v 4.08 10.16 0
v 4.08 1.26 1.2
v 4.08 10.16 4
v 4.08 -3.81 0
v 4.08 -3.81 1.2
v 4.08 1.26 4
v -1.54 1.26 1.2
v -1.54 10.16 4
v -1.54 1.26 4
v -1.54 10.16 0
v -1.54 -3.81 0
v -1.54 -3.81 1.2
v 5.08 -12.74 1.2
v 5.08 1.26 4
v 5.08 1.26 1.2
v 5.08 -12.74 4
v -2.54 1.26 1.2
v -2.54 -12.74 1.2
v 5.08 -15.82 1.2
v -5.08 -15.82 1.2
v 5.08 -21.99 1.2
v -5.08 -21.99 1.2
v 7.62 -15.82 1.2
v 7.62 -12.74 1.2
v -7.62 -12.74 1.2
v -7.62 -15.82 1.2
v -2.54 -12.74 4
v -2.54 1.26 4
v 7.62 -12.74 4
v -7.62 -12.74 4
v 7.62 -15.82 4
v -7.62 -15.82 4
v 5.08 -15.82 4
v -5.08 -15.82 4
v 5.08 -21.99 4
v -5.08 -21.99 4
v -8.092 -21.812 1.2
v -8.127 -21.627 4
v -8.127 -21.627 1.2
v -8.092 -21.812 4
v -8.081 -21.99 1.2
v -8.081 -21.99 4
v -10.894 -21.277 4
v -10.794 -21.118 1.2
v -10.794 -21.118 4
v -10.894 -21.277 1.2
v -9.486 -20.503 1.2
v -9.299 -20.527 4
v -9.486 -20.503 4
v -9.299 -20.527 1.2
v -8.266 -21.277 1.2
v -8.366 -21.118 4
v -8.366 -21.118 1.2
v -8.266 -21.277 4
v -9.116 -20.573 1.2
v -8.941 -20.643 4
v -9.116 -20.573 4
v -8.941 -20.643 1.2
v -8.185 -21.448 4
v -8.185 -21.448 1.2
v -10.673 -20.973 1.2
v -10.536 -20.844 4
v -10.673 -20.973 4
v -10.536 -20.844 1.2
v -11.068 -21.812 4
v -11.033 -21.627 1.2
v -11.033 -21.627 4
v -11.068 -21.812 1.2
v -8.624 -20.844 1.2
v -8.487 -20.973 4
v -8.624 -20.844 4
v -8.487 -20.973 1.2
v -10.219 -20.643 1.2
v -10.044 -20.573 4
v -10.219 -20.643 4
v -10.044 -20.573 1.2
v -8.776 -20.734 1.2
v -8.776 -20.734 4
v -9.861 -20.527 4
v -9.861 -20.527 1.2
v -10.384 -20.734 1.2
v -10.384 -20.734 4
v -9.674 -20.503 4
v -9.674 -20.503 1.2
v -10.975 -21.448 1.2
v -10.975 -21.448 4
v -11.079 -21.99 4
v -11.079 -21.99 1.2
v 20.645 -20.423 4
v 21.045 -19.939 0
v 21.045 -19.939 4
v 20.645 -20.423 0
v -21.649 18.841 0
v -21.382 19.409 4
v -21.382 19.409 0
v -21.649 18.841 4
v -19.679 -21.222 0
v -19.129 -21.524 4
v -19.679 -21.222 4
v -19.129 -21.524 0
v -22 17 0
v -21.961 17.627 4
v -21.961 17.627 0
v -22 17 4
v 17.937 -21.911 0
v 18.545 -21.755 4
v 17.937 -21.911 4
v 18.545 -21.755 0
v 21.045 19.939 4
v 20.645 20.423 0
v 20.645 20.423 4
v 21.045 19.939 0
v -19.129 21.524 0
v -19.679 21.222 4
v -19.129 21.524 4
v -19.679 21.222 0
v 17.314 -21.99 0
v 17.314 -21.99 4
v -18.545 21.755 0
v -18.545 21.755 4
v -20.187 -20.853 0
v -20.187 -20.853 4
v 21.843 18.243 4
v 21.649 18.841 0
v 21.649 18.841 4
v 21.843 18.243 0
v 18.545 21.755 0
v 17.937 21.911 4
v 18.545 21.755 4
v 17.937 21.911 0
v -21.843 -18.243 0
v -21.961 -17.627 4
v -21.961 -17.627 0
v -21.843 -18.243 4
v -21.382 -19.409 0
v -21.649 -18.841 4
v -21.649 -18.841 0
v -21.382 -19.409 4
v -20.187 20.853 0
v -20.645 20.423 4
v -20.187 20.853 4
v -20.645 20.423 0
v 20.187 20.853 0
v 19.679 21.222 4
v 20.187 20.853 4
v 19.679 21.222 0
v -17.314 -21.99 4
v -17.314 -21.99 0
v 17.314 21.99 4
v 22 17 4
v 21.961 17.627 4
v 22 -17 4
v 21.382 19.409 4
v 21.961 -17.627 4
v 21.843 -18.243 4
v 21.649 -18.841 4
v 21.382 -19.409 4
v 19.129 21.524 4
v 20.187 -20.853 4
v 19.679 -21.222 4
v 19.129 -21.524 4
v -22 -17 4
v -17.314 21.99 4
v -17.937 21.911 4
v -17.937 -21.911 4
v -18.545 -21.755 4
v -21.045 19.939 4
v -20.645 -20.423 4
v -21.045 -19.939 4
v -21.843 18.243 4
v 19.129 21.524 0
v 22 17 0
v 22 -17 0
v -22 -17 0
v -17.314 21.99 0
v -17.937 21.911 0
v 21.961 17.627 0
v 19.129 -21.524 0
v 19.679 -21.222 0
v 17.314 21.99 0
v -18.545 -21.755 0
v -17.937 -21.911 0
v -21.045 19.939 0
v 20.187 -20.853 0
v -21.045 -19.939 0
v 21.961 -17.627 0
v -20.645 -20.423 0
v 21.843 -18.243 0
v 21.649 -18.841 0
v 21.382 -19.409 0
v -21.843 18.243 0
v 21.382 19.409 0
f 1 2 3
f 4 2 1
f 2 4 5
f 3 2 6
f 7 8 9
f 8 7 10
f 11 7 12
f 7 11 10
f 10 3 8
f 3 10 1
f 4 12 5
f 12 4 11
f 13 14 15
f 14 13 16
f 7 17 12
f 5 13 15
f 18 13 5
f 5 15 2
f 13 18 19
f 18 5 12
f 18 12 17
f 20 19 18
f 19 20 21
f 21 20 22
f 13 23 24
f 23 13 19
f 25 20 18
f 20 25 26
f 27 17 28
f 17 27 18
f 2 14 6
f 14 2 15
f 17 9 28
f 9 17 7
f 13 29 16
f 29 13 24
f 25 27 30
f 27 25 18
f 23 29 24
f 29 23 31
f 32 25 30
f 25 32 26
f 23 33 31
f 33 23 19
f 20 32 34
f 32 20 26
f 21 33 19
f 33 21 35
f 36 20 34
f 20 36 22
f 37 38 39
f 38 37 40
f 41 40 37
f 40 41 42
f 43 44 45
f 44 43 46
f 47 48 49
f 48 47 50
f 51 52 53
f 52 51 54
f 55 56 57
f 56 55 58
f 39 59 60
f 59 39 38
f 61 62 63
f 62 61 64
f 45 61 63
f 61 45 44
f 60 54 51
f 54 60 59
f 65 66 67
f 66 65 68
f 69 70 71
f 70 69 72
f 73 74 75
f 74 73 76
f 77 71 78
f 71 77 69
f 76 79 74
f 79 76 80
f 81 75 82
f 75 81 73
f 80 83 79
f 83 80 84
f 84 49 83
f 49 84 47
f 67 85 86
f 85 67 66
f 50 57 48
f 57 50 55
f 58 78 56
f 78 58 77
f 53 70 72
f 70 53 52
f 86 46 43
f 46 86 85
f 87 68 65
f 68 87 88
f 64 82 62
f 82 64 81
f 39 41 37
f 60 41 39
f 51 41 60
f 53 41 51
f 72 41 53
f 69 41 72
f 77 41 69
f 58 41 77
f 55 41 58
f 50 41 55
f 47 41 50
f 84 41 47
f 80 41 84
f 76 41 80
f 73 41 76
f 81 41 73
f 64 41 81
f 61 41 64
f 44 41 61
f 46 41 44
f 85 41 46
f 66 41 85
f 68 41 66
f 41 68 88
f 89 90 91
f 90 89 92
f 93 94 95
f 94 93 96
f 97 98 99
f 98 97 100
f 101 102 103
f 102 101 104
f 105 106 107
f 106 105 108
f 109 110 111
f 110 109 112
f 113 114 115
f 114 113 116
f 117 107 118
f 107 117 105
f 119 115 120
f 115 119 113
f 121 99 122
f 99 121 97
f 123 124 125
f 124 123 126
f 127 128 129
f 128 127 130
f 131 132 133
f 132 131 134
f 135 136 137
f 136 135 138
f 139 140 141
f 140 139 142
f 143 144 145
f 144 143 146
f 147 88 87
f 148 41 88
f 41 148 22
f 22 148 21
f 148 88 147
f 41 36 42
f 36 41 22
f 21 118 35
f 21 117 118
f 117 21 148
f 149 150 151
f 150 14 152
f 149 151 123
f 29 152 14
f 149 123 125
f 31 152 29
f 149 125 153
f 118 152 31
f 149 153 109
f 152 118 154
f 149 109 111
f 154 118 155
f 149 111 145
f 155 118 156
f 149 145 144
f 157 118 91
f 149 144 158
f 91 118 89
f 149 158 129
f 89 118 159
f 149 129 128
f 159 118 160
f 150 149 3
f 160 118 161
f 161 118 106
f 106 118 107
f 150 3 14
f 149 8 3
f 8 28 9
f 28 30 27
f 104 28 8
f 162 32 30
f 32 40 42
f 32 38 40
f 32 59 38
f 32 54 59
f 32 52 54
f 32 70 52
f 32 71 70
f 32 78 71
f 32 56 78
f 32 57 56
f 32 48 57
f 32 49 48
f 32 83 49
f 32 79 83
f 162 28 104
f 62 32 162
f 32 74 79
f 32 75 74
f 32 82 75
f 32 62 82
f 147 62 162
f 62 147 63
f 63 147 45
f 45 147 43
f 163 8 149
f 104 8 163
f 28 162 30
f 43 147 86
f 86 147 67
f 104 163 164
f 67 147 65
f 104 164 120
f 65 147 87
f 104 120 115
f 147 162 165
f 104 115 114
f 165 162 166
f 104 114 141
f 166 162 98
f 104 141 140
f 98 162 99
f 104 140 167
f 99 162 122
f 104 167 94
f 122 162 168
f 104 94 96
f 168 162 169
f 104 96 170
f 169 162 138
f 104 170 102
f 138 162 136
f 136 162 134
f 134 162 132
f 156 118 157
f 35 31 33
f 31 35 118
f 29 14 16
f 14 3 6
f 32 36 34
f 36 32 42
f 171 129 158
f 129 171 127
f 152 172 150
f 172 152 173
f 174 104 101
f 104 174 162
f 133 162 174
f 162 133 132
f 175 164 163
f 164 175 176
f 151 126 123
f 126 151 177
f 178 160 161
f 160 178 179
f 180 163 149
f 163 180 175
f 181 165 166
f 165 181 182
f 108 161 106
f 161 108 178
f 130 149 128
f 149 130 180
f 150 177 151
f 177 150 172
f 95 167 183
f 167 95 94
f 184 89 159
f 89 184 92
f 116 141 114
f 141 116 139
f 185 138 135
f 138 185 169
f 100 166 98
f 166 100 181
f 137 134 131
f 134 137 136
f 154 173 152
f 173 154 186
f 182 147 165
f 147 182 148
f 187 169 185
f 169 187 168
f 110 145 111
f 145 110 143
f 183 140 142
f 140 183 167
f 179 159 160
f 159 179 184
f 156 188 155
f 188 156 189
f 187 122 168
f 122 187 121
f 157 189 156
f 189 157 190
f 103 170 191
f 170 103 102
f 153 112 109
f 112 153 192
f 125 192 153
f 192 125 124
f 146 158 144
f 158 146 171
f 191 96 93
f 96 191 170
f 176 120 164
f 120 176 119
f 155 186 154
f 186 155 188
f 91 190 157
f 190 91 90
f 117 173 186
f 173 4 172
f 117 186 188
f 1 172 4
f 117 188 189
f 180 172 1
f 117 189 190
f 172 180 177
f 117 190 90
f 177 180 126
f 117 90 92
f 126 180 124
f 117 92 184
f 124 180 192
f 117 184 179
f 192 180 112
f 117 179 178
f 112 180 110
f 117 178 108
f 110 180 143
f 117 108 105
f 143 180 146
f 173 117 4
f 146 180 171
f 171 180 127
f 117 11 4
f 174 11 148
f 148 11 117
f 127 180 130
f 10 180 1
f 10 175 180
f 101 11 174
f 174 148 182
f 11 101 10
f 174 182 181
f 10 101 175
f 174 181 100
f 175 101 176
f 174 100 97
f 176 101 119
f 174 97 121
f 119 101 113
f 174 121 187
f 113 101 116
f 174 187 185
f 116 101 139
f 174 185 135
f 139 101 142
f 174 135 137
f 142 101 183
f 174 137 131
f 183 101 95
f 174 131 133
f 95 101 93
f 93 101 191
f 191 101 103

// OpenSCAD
$fn = 50;

difference() {
	union() {
		translate(v = [0, 0, 0]) {
			rotate(a = [0, 0, 0]) {
				difference() {
					union() {
						hull() {
							translate(v = [-17.0, 17.0, 0]) {
								cylinder(h = 4, r = 5);
							}
							translate(v = [17.0, 17.0, 0]) {
								cylinder(h = 4, r = 5);
							}
							translate(v = [-17.0, -17.0, 0]) {
								cylinder(h = 4, r = 5);
							}
							translate(v = [17.0, -17.0, 0]) {
								cylinder(h = 4, r = 5);
							}
						}
					}
					union() {
						translate(v = [-1.54, -3.8100000000000005, -1]) {
							cube(size = [5.62, 13.97, 6]);
						}
						translate(v = [-2.54, -12.74, 1.2000000000000002]) {
							cube(size = [7.62, 14.0, 3.8]);
						}
						translate(v = [-7.62, -15.82, 1.2000000000000002]) {
							cube(size = [15.24, 3.08, 3.8]);
						}
						translate(v = [-5.08, -35.82, 1.2000000000000002]) {
							cube(size = [10.16, 20, 3.8]);
						}
						translate(v = [-9.58, -22.0, 1.2000000000000002]) {
							cylinder(h = 3.8, r = 1.5);
						}
					}
				}
			}
		}
	}
	union();
}
